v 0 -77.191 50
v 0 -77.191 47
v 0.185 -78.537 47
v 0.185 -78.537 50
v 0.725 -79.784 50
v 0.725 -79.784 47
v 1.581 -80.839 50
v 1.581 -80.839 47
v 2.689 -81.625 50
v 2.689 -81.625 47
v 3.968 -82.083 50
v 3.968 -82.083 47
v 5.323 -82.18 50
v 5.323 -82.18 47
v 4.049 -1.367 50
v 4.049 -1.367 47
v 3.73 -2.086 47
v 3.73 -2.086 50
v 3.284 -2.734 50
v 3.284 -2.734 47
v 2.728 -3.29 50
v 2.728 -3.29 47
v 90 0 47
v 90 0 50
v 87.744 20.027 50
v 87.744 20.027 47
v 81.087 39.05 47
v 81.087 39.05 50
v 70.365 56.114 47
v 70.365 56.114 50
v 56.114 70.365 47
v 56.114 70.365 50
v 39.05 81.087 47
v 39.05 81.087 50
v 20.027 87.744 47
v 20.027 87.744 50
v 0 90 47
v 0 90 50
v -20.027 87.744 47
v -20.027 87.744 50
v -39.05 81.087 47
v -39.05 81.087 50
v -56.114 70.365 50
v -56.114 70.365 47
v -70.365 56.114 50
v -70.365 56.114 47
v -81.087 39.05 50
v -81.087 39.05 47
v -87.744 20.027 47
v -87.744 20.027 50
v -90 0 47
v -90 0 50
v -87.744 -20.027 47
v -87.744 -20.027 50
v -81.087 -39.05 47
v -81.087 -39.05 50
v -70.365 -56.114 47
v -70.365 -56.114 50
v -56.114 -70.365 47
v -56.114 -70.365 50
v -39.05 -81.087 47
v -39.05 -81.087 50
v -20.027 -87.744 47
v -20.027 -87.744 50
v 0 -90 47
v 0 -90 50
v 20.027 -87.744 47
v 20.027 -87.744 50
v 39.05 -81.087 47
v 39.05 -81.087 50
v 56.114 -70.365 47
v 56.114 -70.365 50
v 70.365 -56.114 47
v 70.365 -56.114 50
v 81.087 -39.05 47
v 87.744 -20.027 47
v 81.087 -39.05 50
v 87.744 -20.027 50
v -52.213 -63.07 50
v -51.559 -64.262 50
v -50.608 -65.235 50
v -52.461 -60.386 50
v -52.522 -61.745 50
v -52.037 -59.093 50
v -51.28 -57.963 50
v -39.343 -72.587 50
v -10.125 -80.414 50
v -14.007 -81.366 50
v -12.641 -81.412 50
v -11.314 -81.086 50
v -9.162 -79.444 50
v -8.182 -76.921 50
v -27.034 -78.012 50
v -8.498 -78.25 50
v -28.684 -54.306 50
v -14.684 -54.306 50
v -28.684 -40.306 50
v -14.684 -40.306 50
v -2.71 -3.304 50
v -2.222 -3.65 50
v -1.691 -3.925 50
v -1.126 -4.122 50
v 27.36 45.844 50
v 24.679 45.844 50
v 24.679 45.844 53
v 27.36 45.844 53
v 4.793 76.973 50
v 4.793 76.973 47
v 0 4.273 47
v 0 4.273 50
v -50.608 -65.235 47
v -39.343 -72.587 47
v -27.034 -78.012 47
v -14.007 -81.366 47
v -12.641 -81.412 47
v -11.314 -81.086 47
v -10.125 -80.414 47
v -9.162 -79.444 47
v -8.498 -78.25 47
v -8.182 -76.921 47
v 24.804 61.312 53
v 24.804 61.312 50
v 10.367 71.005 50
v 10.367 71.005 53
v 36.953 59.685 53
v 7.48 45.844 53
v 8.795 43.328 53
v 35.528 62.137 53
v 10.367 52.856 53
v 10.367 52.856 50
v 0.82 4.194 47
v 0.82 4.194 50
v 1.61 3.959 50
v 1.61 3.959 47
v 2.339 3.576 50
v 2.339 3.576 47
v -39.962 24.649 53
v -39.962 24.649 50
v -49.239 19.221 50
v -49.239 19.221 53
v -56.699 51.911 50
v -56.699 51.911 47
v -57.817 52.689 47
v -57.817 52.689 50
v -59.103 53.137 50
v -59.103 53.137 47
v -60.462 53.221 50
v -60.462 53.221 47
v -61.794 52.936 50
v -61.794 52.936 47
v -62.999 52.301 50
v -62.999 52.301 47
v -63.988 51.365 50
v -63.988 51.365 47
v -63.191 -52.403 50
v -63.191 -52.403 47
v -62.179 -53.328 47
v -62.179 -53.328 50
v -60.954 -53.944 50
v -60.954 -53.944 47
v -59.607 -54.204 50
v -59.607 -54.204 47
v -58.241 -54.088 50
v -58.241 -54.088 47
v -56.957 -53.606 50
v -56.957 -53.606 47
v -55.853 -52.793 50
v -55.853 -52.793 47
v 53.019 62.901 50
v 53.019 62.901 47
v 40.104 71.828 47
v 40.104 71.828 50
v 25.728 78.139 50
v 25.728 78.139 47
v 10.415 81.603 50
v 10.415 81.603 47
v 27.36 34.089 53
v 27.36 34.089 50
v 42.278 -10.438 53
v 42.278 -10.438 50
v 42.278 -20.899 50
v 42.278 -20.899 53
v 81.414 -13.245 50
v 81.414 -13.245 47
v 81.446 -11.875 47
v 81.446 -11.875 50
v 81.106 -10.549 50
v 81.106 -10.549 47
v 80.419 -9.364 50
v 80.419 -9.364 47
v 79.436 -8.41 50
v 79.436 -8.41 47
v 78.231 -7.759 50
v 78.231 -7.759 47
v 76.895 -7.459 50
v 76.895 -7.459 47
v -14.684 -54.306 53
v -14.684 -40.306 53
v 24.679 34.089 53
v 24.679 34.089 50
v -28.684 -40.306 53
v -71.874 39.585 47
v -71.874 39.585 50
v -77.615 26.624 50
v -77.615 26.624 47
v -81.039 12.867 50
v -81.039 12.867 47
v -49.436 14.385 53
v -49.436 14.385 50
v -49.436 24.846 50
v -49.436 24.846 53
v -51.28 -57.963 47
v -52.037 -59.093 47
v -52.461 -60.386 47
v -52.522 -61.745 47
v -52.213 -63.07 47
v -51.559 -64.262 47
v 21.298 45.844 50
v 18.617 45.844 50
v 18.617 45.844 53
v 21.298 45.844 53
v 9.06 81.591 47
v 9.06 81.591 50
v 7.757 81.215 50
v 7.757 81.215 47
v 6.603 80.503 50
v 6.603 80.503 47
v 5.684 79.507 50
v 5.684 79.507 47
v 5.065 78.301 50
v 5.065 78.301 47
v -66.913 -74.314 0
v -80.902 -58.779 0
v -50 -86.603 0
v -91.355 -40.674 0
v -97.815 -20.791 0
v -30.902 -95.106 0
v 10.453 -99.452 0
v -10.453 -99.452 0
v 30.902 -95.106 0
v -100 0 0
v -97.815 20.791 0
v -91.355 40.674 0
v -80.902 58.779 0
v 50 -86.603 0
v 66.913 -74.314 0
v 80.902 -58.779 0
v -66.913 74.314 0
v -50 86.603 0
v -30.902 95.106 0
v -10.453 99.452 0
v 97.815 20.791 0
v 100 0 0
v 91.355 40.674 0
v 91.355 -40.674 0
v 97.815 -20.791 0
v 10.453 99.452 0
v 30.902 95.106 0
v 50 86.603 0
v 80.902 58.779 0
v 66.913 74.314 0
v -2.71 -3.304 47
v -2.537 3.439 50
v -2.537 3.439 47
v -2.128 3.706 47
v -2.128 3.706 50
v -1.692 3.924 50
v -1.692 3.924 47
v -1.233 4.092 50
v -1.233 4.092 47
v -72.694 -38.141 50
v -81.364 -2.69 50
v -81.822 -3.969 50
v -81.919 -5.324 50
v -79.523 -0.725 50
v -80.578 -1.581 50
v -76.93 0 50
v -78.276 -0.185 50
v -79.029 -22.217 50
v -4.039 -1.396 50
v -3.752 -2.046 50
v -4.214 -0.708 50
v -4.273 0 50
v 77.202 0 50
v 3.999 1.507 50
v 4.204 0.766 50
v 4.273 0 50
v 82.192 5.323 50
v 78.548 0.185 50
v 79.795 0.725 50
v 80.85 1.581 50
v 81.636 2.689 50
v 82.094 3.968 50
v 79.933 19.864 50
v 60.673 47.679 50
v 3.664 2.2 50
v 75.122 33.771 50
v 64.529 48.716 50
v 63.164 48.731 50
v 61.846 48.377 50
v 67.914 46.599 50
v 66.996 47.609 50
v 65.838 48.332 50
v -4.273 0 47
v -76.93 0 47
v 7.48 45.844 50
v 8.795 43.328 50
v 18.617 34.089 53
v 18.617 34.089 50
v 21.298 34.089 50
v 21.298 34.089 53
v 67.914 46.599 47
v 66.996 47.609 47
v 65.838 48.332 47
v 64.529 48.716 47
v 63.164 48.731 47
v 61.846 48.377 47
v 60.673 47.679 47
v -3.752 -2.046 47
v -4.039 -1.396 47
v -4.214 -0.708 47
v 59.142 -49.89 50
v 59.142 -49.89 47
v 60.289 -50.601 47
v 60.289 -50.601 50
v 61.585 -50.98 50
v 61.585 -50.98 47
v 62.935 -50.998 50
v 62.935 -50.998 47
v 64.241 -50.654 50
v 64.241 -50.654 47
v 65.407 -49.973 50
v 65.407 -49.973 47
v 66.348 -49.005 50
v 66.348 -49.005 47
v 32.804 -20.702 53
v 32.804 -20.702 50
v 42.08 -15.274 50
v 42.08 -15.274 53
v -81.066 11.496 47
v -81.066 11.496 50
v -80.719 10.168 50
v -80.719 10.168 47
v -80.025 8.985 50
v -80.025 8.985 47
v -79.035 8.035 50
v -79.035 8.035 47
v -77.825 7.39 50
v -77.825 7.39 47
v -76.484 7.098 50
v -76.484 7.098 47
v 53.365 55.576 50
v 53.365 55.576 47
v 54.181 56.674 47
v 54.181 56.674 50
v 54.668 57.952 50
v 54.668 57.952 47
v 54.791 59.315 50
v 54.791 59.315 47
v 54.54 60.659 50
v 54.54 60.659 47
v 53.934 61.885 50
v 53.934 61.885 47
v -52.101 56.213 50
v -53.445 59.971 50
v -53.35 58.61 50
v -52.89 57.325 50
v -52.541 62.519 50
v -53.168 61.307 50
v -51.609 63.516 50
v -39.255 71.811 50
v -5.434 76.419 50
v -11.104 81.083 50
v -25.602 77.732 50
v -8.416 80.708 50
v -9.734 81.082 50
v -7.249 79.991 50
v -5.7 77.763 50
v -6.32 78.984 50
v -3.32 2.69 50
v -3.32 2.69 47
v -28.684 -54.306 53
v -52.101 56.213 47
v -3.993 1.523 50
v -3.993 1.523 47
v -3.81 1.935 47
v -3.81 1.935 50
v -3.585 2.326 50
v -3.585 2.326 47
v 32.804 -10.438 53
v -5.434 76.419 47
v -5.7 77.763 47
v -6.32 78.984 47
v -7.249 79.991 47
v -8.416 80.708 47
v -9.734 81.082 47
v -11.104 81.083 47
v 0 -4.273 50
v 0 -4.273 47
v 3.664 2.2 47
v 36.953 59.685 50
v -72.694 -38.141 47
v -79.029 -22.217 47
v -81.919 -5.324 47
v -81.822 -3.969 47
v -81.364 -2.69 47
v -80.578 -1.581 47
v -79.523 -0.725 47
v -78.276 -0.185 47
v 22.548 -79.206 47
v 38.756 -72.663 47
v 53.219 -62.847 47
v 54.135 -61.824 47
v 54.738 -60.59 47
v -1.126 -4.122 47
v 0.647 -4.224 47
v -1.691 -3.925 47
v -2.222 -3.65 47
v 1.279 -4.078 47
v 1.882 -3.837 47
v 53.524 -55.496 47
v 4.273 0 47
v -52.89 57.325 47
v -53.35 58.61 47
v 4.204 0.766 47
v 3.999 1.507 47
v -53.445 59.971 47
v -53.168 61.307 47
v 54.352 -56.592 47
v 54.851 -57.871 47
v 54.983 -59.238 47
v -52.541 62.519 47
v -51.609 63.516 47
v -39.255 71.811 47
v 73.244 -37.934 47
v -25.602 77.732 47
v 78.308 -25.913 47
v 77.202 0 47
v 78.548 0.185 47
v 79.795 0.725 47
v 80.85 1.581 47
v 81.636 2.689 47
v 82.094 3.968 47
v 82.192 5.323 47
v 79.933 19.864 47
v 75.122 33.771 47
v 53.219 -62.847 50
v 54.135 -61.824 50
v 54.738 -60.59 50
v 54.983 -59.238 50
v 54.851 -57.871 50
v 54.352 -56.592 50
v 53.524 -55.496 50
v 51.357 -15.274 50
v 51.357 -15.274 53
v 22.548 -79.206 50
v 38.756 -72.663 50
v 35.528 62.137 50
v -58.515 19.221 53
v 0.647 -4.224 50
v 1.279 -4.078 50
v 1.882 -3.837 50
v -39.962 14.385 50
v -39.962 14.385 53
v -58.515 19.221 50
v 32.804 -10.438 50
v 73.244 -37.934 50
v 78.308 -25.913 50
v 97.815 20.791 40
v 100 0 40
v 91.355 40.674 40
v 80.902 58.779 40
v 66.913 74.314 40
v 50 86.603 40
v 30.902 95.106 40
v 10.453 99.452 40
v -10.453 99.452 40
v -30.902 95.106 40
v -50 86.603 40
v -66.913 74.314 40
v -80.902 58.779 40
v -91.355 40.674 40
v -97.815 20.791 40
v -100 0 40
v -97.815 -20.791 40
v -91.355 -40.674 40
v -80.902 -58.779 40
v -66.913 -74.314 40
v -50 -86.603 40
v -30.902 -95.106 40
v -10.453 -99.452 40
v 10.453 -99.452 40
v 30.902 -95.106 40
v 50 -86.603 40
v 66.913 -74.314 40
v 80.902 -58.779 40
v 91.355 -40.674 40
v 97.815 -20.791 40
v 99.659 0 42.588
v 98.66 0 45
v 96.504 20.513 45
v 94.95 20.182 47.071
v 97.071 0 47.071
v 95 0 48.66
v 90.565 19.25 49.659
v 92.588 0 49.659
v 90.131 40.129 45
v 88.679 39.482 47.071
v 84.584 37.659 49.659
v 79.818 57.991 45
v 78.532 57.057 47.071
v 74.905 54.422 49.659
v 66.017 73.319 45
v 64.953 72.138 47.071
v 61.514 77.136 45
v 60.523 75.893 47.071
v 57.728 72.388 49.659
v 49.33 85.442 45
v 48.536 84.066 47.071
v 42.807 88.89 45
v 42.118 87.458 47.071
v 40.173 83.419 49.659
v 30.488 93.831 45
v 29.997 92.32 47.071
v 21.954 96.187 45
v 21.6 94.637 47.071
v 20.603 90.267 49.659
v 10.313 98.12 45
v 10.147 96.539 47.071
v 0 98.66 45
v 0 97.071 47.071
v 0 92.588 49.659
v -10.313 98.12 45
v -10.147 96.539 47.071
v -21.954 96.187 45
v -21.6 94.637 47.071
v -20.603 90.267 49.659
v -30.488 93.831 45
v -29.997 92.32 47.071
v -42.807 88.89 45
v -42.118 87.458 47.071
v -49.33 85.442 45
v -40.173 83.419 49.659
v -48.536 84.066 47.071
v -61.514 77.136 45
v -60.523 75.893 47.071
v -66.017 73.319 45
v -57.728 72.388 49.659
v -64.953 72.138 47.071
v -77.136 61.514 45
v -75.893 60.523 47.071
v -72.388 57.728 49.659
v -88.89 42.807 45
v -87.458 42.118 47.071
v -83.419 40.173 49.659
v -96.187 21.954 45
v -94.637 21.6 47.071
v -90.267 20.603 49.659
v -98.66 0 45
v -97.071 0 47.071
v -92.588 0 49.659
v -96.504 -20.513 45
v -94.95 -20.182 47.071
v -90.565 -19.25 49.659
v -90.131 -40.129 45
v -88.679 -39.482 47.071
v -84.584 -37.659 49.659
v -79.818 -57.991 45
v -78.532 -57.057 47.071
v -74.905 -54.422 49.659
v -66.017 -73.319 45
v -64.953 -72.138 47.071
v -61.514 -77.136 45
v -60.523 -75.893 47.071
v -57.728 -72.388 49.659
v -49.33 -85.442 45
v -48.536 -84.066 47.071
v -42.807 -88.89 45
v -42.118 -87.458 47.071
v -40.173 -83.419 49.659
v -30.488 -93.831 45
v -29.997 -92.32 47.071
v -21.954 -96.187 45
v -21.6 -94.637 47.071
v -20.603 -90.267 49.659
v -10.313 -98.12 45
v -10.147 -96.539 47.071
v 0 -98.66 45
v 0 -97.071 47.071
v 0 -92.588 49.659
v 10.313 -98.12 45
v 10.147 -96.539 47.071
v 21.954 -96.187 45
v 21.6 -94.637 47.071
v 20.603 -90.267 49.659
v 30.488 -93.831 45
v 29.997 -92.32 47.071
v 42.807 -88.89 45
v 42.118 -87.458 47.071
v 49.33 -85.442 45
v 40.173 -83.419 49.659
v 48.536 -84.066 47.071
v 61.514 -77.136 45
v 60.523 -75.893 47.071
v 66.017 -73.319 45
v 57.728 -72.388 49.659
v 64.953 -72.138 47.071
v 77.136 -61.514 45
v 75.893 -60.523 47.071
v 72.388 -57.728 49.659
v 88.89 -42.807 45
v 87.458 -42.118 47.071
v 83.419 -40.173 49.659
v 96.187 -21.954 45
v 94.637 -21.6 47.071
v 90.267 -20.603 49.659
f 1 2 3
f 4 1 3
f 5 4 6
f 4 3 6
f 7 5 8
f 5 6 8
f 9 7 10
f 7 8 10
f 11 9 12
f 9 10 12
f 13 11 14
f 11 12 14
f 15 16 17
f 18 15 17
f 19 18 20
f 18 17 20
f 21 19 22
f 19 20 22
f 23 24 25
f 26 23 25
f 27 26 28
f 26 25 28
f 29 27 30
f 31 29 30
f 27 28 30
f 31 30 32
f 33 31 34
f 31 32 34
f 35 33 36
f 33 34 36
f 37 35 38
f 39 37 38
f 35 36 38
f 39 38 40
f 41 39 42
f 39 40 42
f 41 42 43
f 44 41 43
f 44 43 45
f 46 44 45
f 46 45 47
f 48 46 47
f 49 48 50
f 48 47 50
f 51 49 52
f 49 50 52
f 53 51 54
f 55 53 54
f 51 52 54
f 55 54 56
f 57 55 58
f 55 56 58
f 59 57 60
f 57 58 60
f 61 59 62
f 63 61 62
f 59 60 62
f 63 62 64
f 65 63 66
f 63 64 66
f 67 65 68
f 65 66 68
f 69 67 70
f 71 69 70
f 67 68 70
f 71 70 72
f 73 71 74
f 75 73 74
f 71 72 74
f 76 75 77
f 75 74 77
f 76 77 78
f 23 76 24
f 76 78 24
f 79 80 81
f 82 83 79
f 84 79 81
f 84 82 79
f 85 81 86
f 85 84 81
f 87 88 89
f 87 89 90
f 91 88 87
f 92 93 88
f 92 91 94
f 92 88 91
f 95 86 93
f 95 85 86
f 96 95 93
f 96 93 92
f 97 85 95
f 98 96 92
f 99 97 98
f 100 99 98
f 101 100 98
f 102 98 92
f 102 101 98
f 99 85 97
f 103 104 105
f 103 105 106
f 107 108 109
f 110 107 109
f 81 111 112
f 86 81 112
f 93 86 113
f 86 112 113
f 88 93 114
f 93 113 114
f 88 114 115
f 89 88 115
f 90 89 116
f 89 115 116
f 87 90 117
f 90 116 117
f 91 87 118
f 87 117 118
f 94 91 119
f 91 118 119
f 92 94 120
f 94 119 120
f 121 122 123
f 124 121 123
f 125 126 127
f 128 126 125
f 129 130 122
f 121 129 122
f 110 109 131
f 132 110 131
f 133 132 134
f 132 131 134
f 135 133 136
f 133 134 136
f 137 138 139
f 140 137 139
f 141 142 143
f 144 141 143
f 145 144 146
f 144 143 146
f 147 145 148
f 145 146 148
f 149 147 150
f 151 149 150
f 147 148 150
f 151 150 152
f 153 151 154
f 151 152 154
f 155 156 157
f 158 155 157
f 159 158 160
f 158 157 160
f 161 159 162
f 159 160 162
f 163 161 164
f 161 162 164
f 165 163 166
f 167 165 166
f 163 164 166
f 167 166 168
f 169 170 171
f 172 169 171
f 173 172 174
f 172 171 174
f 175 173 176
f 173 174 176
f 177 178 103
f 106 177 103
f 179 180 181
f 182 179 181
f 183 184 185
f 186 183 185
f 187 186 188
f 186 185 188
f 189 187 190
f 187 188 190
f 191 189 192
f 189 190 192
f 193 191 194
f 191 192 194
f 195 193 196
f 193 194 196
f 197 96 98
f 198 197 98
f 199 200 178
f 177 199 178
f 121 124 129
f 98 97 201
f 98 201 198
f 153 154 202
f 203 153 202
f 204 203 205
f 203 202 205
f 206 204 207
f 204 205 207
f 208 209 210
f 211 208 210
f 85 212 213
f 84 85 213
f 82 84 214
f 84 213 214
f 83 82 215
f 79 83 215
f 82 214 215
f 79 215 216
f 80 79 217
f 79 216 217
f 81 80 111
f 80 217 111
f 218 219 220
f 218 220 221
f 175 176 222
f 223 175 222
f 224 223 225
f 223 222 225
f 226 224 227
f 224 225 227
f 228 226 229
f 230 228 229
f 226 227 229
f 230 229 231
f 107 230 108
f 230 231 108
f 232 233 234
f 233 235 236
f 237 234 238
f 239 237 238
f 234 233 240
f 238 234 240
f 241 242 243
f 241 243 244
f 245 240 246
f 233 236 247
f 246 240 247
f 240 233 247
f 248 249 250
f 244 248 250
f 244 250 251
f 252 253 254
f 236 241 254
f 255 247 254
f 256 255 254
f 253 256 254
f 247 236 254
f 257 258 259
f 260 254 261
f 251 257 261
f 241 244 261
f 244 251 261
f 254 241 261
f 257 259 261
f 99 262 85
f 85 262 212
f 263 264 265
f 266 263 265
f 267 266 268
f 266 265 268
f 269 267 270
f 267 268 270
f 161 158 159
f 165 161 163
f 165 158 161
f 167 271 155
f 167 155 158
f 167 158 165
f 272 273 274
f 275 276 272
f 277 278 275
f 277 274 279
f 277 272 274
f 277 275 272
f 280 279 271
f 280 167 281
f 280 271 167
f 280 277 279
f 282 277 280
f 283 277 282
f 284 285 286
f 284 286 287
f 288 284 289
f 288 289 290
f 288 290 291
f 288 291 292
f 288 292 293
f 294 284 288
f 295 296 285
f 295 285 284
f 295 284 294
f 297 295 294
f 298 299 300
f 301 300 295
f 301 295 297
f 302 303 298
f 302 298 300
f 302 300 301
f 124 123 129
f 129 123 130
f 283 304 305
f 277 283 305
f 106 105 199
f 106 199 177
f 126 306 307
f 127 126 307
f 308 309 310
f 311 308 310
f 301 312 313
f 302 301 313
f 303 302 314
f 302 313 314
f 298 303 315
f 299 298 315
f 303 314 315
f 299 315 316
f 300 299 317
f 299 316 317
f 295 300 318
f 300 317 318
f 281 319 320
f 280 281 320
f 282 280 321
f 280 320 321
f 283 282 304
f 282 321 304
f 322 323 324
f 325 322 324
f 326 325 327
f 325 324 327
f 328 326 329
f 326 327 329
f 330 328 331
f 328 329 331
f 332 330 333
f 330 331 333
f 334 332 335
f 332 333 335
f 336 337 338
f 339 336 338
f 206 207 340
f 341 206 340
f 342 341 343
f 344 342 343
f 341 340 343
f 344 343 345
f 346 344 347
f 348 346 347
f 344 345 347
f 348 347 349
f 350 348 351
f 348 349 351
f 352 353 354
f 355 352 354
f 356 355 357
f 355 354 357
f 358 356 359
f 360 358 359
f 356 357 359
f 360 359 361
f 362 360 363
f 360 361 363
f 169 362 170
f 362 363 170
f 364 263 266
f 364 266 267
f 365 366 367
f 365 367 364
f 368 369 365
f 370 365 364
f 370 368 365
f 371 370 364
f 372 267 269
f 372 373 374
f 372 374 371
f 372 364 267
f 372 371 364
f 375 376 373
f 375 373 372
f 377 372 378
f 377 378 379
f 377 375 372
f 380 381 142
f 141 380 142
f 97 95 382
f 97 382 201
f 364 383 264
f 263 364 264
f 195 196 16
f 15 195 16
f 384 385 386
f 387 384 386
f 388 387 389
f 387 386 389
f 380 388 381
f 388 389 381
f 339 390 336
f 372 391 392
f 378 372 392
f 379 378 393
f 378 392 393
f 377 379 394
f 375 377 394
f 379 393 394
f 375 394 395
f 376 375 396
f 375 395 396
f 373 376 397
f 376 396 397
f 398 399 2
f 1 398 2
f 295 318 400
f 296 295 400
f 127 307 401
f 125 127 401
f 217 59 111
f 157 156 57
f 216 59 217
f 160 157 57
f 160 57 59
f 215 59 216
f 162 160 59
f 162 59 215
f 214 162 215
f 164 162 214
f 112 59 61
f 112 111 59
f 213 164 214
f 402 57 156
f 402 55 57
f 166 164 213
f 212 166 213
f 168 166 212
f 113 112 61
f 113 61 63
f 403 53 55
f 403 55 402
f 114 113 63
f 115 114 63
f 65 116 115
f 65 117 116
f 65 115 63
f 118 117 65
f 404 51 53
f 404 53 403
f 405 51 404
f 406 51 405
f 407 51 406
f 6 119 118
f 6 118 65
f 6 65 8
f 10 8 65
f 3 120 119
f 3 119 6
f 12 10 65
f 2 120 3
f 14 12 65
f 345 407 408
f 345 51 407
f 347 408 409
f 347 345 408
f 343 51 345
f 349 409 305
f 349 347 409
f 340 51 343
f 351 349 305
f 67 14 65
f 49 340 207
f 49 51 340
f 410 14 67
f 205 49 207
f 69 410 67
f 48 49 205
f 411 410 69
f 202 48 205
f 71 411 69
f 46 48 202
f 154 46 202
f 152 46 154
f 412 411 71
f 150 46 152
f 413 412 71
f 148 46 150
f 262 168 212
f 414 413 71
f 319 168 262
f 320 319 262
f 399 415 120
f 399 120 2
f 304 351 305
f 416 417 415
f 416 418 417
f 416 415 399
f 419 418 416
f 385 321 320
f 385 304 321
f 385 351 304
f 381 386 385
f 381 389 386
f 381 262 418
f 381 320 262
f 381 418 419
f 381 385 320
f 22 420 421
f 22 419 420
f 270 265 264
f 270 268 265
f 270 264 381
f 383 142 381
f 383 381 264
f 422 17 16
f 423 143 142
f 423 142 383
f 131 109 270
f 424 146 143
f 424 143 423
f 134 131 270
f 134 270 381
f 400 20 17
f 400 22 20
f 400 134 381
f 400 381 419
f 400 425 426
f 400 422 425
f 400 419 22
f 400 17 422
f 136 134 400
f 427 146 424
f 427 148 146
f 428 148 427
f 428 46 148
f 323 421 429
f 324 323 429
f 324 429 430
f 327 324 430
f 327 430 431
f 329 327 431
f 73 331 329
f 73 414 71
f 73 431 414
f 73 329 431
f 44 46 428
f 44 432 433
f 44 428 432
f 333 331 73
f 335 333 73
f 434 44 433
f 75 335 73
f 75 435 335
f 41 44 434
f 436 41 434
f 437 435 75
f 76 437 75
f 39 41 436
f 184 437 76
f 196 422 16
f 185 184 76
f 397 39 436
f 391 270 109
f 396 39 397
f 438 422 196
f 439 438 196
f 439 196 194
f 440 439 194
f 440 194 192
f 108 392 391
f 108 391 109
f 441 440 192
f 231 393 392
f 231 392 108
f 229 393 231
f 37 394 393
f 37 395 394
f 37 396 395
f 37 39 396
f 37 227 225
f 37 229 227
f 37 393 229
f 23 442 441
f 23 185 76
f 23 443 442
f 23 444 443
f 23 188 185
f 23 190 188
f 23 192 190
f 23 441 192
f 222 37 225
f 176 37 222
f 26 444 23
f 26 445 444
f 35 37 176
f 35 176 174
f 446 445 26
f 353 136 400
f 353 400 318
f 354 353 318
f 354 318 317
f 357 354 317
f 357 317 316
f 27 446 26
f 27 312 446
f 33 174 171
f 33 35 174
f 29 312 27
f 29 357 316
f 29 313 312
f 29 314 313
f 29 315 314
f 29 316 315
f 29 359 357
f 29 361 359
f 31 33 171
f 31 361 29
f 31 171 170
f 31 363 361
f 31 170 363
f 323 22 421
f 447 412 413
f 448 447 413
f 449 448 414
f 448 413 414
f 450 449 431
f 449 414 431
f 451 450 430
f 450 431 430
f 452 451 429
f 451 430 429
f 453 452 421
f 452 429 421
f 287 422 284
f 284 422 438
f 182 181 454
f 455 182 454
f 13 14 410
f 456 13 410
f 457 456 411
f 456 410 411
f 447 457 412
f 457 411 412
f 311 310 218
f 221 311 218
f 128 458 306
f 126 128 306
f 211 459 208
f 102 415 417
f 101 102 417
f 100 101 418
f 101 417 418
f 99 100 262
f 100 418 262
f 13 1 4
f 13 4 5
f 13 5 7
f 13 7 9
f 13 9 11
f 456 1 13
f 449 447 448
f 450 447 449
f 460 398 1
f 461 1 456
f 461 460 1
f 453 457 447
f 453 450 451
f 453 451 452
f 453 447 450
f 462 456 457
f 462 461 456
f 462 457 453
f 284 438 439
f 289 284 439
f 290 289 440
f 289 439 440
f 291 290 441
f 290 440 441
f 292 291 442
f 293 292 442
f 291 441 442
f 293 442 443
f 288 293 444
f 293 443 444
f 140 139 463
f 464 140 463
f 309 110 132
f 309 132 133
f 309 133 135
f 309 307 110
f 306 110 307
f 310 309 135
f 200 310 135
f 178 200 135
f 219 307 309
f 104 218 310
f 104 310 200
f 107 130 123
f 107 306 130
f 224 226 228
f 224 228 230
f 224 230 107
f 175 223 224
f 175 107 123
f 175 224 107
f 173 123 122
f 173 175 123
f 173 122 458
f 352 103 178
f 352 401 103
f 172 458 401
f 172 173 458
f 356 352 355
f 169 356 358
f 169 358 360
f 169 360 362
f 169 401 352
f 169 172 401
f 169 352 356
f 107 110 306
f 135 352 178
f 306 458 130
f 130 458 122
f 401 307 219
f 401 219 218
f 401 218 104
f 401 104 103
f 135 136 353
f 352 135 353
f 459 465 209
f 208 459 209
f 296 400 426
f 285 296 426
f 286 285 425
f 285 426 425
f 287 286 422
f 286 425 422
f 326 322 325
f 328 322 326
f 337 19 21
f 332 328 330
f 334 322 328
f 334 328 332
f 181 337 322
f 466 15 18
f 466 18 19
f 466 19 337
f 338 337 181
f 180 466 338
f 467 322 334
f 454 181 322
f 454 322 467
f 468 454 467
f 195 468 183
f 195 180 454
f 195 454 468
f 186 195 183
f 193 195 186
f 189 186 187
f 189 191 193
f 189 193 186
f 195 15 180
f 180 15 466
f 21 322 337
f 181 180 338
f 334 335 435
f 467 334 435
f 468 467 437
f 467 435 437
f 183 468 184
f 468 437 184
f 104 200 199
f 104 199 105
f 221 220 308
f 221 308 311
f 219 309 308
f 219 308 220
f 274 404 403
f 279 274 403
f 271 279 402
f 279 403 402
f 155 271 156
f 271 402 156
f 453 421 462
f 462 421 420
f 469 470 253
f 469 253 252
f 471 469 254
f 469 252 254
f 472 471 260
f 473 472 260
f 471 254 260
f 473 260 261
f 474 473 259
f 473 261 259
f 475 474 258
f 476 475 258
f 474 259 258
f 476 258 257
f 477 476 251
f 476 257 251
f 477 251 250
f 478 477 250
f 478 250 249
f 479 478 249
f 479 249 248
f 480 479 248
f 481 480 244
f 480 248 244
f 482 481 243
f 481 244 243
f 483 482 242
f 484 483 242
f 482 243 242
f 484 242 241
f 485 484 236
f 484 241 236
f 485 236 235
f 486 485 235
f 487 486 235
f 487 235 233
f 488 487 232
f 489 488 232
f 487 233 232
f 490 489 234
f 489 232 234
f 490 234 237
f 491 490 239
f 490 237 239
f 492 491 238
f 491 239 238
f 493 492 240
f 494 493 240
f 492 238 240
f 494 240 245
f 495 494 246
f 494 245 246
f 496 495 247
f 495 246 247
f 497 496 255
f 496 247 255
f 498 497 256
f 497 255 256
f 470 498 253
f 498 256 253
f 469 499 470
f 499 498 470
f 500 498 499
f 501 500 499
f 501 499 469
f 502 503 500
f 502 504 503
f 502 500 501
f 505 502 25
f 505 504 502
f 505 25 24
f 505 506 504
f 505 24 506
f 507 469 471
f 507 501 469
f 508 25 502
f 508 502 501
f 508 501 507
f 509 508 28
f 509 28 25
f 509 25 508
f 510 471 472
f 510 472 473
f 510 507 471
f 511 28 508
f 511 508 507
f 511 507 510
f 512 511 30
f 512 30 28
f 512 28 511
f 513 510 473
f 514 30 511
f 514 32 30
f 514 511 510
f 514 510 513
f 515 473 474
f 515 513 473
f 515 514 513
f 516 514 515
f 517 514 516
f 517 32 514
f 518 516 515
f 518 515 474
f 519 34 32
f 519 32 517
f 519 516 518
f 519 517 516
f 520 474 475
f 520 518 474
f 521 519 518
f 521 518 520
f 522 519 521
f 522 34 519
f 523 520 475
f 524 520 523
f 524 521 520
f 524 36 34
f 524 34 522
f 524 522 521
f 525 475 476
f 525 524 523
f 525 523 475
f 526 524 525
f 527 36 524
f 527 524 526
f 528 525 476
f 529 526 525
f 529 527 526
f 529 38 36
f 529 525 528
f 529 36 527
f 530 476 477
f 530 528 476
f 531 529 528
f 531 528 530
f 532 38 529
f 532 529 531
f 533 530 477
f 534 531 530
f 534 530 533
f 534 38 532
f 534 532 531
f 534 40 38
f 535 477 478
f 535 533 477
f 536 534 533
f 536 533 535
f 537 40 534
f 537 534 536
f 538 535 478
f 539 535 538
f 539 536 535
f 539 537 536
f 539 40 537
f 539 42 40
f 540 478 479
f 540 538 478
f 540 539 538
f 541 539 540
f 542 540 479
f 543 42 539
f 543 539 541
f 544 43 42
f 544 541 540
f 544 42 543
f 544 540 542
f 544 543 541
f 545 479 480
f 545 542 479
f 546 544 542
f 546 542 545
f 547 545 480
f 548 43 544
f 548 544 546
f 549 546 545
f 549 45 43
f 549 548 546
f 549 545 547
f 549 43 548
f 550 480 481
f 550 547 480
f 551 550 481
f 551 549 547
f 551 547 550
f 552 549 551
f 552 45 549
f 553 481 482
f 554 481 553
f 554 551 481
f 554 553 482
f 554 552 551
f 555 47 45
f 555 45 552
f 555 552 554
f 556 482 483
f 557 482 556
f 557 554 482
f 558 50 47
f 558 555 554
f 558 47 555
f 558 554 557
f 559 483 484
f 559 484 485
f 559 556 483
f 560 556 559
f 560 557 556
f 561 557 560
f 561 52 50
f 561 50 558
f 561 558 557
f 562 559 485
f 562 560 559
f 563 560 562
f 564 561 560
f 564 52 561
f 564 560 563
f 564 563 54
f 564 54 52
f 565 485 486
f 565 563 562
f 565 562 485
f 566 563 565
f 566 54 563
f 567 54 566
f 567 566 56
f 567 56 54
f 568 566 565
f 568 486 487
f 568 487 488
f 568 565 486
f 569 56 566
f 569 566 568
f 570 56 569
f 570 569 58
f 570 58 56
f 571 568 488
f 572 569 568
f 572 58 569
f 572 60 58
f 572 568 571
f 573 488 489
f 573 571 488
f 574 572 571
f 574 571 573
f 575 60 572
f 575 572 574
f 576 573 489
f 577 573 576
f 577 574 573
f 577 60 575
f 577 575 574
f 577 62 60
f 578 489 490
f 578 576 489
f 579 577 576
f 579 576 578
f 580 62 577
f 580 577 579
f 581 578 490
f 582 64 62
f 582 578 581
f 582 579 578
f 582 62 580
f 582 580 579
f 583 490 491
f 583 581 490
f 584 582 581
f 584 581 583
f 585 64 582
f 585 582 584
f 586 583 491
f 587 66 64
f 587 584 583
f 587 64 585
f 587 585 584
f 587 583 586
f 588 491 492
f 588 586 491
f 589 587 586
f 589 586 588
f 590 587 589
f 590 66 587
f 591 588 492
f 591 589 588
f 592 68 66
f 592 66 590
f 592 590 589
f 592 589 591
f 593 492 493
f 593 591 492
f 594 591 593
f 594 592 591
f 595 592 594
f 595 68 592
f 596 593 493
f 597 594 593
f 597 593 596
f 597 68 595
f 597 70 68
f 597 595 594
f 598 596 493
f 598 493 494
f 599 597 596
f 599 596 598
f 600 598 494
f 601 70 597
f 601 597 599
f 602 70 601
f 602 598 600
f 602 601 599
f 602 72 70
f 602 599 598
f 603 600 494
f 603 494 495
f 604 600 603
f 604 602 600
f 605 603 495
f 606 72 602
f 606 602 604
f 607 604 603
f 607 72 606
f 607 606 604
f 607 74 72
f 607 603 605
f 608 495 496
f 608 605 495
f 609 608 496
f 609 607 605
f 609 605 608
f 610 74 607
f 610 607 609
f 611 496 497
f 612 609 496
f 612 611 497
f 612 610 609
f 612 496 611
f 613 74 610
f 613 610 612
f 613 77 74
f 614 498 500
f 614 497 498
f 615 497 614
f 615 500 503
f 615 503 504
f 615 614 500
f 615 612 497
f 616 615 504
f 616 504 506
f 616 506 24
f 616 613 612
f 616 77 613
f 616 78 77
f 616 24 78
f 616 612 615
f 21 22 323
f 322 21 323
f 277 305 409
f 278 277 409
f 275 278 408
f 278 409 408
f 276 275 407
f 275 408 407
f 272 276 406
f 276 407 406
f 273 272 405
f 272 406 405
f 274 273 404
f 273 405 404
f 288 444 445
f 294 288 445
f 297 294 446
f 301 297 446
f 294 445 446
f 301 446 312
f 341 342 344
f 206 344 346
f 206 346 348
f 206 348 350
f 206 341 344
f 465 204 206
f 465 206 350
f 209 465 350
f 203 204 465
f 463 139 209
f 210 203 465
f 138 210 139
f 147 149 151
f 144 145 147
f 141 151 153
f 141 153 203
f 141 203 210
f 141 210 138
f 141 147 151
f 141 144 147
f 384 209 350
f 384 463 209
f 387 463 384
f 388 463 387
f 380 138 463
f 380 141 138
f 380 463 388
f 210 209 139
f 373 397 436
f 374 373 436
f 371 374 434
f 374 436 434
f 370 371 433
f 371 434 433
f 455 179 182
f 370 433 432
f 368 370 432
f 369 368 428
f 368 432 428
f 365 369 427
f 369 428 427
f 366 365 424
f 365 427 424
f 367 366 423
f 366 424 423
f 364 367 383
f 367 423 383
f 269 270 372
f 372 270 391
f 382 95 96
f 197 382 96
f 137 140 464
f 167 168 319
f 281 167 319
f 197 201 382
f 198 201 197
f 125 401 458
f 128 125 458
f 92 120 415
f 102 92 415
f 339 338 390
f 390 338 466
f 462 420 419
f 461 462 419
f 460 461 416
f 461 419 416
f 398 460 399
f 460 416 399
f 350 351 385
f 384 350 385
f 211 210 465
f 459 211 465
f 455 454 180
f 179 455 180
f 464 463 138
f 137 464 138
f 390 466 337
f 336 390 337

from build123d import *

# Parameters (mm, degrees)
F0_R      = 100
F1_DEPTH  = 50
F2_R      = 10
F1_FACE_R = 90
F3_DEPTH  = 3
F5_DEPTH  = 3
F7_W      = 2.681116
F7_H      = 11.75565
F7_W_2    = 14
F7_H_2    = 14
F8_DEPTH  = 3


with BuildPart() as f1:
    # F0 (on Top) → F1 (new body)
    with BuildSketch(Plane.XY):
        Circle(F0_R)
    extrude(amount=F1_DEPTH)

    # F2
    f2_edges = [f1.edges().sort_by_distance(p)[0] for p in [
        (-100, 0, 50),
    ]]
    fillet(f2_edges, radius=F2_R)

    # F1_face (on face) → F3 (cut)
    with BuildSketch(Plane.XY.offset(50)):
        Circle(F1_FACE_R)
    extrude(amount=-F3_DEPTH, mode=Mode.SUBTRACT)

    # F4 (on face) → F5 (join)
    with BuildSketch(Plane.XY.offset(47)):
        with BuildLine():
            ThreePointArc((53.019027, 62.901433), (33.066942, 75.327185), (10.415382, 81.603476))
            ThreePointArc((10.415382, 81.603476), (6.603495, 80.503103), (4.793179, 76.972655))
            Line((4.793179, 76.972655), (0, 4.273428))
            ThreePointArc((0, 4.273428), (1.220514, 4.095428), (2.339353, 3.576257))
            Line((2.339353, 3.576257), (53.365395, 55.576407))
            ThreePointArc((53.365395, 55.576407), (54.791012, 59.31452), (53.019027, 62.901433))
        make_face()
        with BuildLine():
            Line((60.673054, 47.679128), (3.6639, 2.19955))
            ThreePointArc((3.6639, 2.19955), (4.118228, 1.141221), (4.273428, 0))
            Line((4.273428, 0), (77.20216, 0))
            ThreePointArc((77.20216, 0), (80.850155, 1.580624), (82.191706, 5.323148))
            ThreePointArc((82.191706, 5.323148), (77.83869, 26.924909), (67.913987, 46.599387))
            ThreePointArc((67.913987, 46.599387), (64.528614, 48.715836), (60.673054, 47.679128))
        make_face()
        with BuildLine():
            Line((76.89521, -7.459046), (4.048797, -1.367271))
            ThreePointArc((4.048797, -1.367271), (3.521918, -2.420388), (2.727619, -3.289723))
            Line((2.727619, -3.289723), (59.141904, -49.88977))
            ThreePointArc((59.141904, -49.88977), (62.935195, -50.997631), (66.348065, -49.005464))
            ThreePointArc((66.348065, -49.005464), (76.013771, -32.023551), (81.413661, -13.244508))
            ThreePointArc((81.413661, -13.244508), (80.419138, -9.364044), (76.89521, -7.459046))
        make_face()
        with BuildLine():
            Line((53.523655, -55.496099), (1.881672, -3.83686))
            ThreePointArc((1.881672, -3.83686), (0.965826, -4.162855), (0, -4.273428))
            Line((0, -4.273428), (0, -77.190785))
            ThreePointArc((0, -77.190785), (1.580642, -80.838796), (5.323196, -82.180328))
            ThreePointArc((5.323196, -82.180328), (30.825875, -76.365622), (53.21868, -62.846757))
            ThreePointArc((53.21868, -62.846757), (54.983233, -59.238312), (53.523655, -55.496099))
        make_face()
        with BuildLine():
            ThreePointArc((-1.125943, -4.122431), (-1.961033, -3.796911), (-2.709859, -3.304368))
            Line((-2.709859, -3.304368), (-51.280371, -57.962817))
            ThreePointArc((-51.280371, -57.962817), (-52.52156, -61.744691), (-50.6076, -65.234659))
            ThreePointArc((-50.6076, -65.234659), (-33.298804, -75.55051), (-14.006687, -81.366471))
            ThreePointArc((-14.006687, -81.366471), (-10.12515, -80.413756), (-8.181768, -76.921298))
            Line((-8.181768, -76.921298), (-1.125943, -4.122431))
        make_face()
        with BuildLine():
            ThreePointArc((-3.751637, -2.046315), (-4.140926, -1.055896), (-4.273428, 0))
            Line((-4.273428, 0), (-76.929663, 0))
            ThreePointArc((-76.929663, 0), (-80.578049, -1.581041), (-81.919135, -5.324288))
            ThreePointArc((-81.919135, -5.324288), (-76.277786, -30.344556), (-63.190557, -52.402731))
            ThreePointArc((-63.190557, -52.402731), (-59.607242, -54.203971), (-55.85314, -52.792826))
            Line((-55.85314, -52.792826), (-3.751637, -2.046315))
        make_face()
        with BuildLine():
            ThreePointArc((-3.992636, 1.523496), (-3.70279, 2.133433), (-3.320478, 2.690094))
            Line((-3.320478, 2.690094), (-56.699298, 51.911248))
            ThreePointArc((-56.699298, 51.911248), (-60.462161, 53.221499), (-63.987913, 51.365437))
            ThreePointArc((-63.987913, 51.365437), (-75.024742, 33.228741), (-81.038817, 12.867449))
            ThreePointArc((-81.038817, 12.867449), (-80.025089, 8.98514), (-76.484046, 7.098084))
            Line((-76.484046, 7.098084), (-3.992636, 1.523496))
        make_face()
        with BuildLine():
            ThreePointArc((-2.536746, 3.439056), (-1.913037, 3.821319), (-1.233269, 4.091605))
            Line((-1.233269, 4.091605), (-5.433671, 76.419476))
            ThreePointArc((-5.433671, 76.419476), (-7.248956, 79.99108), (-11.103634, 81.083359))
            ThreePointArc((-11.103634, 81.083359), (-32.563457, 75.082775), (-51.60924, 63.516046))
            ThreePointArc((-51.60924, 63.516046), (-53.4449, 59.971321), (-52.100808, 56.212578))
            Line((-52.100808, 56.212578), (-2.536746, 3.439056))
        make_face()
    extrude(amount=F5_DEPTH)

    # F7 (on face) → F8 (join)
    with BuildSketch(Plane.XY.offset(50)):
        Polygon((24.804033, 61.312177), (10.367269, 71.005437), (10.367269, 52.856359), align=None)
        Polygon((35.528484, 62.137136), (7.479916, 45.844217), (8.79458, 43.327766), (36.953135, 59.684574), align=None)
        with Locations((19.957405, 39.966392)):
            Rectangle(F7_W, F7_H)
        with Locations((26.019179, 39.966392)):
            Rectangle(F7_W, F7_H)
        with Locations((-21.684457, -47.305547)):
            Rectangle(F7_W_2, F7_H_2)
        Polygon((42.08035, -15.2739), (32.804038, -10.438373), (32.804038, -20.701531), align=None)
        Polygon((51.35667, -15.2739), (42.27772, -10.438373), (42.27772, -20.898901), align=None)
        Polygon((-49.238652, 19.220938), (-39.96234, 14.385412), (-39.96234, 24.64857), align=None)
        Polygon((-58.514971, 19.220938), (-49.436022, 14.385412), (-49.436022, 24.845939), align=None)
    extrude(amount=F8_DEPTH)


solid = f1.part
